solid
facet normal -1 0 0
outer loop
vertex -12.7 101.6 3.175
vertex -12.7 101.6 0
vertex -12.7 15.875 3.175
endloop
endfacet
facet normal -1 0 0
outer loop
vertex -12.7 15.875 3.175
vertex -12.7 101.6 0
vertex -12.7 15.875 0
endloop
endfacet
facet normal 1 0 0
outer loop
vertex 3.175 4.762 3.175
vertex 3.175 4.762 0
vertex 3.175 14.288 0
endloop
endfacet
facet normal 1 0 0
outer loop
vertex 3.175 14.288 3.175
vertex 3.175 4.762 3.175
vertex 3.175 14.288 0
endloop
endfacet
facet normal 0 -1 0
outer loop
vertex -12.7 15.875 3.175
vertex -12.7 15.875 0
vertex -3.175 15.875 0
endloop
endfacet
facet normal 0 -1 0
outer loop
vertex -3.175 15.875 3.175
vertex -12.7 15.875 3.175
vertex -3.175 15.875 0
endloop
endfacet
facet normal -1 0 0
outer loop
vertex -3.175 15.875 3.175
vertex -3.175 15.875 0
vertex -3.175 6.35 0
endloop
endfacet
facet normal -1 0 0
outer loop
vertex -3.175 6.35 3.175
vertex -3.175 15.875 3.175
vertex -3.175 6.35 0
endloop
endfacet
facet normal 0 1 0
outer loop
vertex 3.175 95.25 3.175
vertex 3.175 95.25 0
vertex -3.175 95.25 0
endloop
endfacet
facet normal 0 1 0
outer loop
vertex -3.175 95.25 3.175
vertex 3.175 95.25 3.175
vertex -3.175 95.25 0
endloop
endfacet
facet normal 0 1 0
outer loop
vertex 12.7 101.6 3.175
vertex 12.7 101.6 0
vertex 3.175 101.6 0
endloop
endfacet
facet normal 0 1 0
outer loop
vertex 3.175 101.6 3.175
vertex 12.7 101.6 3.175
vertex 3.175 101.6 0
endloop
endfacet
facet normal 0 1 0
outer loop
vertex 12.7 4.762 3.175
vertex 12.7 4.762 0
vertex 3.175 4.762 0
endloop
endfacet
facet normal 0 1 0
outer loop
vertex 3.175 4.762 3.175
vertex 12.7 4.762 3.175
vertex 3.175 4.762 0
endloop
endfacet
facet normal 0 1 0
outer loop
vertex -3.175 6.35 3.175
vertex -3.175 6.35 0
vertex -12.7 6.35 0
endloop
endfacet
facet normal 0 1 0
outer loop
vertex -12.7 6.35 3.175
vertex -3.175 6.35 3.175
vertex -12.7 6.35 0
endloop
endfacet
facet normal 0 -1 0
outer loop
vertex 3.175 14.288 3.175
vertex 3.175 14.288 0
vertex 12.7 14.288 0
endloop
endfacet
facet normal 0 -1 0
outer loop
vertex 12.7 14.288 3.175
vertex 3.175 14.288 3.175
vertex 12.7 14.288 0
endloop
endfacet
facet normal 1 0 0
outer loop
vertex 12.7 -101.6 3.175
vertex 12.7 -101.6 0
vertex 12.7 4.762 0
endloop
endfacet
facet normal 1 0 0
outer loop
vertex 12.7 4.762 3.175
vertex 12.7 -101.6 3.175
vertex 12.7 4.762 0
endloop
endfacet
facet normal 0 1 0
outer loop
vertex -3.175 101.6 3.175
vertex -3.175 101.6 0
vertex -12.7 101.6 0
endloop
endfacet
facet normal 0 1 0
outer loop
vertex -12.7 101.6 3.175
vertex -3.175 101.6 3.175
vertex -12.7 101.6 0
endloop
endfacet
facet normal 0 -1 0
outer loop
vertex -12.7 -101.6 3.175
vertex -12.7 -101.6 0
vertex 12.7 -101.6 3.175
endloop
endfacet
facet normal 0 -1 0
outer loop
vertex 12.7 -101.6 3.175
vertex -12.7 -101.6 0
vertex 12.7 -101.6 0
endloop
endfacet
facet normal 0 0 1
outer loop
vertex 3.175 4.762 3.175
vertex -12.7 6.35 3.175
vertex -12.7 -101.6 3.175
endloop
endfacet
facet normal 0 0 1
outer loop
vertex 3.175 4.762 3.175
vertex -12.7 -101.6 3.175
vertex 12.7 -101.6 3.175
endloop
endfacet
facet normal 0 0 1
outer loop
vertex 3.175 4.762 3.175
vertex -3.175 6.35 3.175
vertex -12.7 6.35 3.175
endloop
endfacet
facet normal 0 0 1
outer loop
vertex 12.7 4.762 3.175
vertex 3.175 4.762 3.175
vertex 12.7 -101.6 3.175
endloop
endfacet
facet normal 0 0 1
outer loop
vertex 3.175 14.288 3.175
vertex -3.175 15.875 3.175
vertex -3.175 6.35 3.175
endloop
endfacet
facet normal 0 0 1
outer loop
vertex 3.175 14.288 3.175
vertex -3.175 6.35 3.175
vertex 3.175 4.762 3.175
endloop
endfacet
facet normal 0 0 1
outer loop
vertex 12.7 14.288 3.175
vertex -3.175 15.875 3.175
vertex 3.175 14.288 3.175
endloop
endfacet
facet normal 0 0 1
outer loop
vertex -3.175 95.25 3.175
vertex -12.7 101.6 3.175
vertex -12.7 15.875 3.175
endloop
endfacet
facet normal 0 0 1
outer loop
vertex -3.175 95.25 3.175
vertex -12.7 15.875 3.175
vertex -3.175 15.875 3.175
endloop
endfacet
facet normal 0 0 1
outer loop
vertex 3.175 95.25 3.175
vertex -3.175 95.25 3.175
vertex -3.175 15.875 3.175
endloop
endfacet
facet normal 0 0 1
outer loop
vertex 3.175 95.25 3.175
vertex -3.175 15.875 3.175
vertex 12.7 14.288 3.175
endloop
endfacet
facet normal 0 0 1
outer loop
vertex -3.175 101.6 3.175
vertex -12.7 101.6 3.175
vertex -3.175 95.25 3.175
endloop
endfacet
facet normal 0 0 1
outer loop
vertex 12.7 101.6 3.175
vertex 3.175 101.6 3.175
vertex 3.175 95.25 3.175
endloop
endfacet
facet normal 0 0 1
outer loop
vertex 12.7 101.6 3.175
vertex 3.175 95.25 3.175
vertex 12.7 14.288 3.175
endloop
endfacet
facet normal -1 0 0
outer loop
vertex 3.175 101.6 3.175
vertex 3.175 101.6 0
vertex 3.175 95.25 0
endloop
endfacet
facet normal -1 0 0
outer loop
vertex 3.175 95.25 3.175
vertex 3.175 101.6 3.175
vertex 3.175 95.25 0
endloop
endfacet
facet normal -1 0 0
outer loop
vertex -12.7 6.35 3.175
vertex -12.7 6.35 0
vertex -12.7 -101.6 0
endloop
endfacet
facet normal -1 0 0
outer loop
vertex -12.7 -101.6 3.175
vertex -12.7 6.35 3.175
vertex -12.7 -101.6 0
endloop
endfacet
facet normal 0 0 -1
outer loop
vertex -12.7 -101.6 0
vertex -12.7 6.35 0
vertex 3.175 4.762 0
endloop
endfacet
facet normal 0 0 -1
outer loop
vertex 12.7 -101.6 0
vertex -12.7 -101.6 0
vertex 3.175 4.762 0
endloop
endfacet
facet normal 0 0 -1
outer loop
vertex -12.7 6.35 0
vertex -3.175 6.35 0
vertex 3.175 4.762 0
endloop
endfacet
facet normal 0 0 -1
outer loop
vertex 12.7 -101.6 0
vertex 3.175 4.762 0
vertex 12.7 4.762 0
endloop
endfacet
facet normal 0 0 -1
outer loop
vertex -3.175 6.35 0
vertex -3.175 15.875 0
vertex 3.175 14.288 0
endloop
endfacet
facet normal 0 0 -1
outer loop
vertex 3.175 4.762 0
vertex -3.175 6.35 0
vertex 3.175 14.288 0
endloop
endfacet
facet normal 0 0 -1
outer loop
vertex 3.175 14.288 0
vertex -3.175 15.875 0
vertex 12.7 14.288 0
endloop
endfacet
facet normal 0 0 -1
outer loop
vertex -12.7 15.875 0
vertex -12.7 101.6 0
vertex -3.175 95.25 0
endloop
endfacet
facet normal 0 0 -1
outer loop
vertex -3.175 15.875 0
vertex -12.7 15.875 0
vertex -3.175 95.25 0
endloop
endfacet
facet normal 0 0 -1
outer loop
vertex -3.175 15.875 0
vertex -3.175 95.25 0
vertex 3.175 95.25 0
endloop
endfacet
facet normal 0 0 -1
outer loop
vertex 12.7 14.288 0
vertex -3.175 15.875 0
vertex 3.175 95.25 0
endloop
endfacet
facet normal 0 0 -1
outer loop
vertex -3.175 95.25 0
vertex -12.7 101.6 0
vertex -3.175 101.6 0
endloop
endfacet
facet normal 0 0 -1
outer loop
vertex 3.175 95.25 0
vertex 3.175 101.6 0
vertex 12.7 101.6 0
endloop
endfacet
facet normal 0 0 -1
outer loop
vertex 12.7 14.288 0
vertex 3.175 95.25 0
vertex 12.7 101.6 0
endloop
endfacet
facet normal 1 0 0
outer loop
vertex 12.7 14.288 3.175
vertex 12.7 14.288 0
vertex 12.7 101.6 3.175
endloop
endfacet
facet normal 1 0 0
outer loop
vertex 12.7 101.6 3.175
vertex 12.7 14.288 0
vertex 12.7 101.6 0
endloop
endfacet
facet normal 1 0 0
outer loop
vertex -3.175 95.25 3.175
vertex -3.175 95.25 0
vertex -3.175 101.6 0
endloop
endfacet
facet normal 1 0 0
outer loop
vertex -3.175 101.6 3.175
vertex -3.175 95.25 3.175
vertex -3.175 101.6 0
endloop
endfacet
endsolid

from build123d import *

# Parameters (mm, degrees)
F1_DEPTH = 3.175


with BuildPart() as f1:
    # F0 (on Top) → F1 (new body)
    with BuildSketch(Plane.XY):
        Polygon((-12.7, 6.35), (-12.7, -101.6), (12.7, -101.6), (12.7, 4.7625), (3.175, 4.7625), (3.175, 14.2875), (12.7, 14.2875), (12.7, 101.6), (3.175, 101.6), (3.175, 95.25), (-3.175, 95.25), (-3.175, 101.6), (-12.7, 101.6), (-12.7, 15.875), (-3.175, 15.875), (-3.175, 6.35), align=None)
    extrude(amount=F1_DEPTH)


solid = f1.part
